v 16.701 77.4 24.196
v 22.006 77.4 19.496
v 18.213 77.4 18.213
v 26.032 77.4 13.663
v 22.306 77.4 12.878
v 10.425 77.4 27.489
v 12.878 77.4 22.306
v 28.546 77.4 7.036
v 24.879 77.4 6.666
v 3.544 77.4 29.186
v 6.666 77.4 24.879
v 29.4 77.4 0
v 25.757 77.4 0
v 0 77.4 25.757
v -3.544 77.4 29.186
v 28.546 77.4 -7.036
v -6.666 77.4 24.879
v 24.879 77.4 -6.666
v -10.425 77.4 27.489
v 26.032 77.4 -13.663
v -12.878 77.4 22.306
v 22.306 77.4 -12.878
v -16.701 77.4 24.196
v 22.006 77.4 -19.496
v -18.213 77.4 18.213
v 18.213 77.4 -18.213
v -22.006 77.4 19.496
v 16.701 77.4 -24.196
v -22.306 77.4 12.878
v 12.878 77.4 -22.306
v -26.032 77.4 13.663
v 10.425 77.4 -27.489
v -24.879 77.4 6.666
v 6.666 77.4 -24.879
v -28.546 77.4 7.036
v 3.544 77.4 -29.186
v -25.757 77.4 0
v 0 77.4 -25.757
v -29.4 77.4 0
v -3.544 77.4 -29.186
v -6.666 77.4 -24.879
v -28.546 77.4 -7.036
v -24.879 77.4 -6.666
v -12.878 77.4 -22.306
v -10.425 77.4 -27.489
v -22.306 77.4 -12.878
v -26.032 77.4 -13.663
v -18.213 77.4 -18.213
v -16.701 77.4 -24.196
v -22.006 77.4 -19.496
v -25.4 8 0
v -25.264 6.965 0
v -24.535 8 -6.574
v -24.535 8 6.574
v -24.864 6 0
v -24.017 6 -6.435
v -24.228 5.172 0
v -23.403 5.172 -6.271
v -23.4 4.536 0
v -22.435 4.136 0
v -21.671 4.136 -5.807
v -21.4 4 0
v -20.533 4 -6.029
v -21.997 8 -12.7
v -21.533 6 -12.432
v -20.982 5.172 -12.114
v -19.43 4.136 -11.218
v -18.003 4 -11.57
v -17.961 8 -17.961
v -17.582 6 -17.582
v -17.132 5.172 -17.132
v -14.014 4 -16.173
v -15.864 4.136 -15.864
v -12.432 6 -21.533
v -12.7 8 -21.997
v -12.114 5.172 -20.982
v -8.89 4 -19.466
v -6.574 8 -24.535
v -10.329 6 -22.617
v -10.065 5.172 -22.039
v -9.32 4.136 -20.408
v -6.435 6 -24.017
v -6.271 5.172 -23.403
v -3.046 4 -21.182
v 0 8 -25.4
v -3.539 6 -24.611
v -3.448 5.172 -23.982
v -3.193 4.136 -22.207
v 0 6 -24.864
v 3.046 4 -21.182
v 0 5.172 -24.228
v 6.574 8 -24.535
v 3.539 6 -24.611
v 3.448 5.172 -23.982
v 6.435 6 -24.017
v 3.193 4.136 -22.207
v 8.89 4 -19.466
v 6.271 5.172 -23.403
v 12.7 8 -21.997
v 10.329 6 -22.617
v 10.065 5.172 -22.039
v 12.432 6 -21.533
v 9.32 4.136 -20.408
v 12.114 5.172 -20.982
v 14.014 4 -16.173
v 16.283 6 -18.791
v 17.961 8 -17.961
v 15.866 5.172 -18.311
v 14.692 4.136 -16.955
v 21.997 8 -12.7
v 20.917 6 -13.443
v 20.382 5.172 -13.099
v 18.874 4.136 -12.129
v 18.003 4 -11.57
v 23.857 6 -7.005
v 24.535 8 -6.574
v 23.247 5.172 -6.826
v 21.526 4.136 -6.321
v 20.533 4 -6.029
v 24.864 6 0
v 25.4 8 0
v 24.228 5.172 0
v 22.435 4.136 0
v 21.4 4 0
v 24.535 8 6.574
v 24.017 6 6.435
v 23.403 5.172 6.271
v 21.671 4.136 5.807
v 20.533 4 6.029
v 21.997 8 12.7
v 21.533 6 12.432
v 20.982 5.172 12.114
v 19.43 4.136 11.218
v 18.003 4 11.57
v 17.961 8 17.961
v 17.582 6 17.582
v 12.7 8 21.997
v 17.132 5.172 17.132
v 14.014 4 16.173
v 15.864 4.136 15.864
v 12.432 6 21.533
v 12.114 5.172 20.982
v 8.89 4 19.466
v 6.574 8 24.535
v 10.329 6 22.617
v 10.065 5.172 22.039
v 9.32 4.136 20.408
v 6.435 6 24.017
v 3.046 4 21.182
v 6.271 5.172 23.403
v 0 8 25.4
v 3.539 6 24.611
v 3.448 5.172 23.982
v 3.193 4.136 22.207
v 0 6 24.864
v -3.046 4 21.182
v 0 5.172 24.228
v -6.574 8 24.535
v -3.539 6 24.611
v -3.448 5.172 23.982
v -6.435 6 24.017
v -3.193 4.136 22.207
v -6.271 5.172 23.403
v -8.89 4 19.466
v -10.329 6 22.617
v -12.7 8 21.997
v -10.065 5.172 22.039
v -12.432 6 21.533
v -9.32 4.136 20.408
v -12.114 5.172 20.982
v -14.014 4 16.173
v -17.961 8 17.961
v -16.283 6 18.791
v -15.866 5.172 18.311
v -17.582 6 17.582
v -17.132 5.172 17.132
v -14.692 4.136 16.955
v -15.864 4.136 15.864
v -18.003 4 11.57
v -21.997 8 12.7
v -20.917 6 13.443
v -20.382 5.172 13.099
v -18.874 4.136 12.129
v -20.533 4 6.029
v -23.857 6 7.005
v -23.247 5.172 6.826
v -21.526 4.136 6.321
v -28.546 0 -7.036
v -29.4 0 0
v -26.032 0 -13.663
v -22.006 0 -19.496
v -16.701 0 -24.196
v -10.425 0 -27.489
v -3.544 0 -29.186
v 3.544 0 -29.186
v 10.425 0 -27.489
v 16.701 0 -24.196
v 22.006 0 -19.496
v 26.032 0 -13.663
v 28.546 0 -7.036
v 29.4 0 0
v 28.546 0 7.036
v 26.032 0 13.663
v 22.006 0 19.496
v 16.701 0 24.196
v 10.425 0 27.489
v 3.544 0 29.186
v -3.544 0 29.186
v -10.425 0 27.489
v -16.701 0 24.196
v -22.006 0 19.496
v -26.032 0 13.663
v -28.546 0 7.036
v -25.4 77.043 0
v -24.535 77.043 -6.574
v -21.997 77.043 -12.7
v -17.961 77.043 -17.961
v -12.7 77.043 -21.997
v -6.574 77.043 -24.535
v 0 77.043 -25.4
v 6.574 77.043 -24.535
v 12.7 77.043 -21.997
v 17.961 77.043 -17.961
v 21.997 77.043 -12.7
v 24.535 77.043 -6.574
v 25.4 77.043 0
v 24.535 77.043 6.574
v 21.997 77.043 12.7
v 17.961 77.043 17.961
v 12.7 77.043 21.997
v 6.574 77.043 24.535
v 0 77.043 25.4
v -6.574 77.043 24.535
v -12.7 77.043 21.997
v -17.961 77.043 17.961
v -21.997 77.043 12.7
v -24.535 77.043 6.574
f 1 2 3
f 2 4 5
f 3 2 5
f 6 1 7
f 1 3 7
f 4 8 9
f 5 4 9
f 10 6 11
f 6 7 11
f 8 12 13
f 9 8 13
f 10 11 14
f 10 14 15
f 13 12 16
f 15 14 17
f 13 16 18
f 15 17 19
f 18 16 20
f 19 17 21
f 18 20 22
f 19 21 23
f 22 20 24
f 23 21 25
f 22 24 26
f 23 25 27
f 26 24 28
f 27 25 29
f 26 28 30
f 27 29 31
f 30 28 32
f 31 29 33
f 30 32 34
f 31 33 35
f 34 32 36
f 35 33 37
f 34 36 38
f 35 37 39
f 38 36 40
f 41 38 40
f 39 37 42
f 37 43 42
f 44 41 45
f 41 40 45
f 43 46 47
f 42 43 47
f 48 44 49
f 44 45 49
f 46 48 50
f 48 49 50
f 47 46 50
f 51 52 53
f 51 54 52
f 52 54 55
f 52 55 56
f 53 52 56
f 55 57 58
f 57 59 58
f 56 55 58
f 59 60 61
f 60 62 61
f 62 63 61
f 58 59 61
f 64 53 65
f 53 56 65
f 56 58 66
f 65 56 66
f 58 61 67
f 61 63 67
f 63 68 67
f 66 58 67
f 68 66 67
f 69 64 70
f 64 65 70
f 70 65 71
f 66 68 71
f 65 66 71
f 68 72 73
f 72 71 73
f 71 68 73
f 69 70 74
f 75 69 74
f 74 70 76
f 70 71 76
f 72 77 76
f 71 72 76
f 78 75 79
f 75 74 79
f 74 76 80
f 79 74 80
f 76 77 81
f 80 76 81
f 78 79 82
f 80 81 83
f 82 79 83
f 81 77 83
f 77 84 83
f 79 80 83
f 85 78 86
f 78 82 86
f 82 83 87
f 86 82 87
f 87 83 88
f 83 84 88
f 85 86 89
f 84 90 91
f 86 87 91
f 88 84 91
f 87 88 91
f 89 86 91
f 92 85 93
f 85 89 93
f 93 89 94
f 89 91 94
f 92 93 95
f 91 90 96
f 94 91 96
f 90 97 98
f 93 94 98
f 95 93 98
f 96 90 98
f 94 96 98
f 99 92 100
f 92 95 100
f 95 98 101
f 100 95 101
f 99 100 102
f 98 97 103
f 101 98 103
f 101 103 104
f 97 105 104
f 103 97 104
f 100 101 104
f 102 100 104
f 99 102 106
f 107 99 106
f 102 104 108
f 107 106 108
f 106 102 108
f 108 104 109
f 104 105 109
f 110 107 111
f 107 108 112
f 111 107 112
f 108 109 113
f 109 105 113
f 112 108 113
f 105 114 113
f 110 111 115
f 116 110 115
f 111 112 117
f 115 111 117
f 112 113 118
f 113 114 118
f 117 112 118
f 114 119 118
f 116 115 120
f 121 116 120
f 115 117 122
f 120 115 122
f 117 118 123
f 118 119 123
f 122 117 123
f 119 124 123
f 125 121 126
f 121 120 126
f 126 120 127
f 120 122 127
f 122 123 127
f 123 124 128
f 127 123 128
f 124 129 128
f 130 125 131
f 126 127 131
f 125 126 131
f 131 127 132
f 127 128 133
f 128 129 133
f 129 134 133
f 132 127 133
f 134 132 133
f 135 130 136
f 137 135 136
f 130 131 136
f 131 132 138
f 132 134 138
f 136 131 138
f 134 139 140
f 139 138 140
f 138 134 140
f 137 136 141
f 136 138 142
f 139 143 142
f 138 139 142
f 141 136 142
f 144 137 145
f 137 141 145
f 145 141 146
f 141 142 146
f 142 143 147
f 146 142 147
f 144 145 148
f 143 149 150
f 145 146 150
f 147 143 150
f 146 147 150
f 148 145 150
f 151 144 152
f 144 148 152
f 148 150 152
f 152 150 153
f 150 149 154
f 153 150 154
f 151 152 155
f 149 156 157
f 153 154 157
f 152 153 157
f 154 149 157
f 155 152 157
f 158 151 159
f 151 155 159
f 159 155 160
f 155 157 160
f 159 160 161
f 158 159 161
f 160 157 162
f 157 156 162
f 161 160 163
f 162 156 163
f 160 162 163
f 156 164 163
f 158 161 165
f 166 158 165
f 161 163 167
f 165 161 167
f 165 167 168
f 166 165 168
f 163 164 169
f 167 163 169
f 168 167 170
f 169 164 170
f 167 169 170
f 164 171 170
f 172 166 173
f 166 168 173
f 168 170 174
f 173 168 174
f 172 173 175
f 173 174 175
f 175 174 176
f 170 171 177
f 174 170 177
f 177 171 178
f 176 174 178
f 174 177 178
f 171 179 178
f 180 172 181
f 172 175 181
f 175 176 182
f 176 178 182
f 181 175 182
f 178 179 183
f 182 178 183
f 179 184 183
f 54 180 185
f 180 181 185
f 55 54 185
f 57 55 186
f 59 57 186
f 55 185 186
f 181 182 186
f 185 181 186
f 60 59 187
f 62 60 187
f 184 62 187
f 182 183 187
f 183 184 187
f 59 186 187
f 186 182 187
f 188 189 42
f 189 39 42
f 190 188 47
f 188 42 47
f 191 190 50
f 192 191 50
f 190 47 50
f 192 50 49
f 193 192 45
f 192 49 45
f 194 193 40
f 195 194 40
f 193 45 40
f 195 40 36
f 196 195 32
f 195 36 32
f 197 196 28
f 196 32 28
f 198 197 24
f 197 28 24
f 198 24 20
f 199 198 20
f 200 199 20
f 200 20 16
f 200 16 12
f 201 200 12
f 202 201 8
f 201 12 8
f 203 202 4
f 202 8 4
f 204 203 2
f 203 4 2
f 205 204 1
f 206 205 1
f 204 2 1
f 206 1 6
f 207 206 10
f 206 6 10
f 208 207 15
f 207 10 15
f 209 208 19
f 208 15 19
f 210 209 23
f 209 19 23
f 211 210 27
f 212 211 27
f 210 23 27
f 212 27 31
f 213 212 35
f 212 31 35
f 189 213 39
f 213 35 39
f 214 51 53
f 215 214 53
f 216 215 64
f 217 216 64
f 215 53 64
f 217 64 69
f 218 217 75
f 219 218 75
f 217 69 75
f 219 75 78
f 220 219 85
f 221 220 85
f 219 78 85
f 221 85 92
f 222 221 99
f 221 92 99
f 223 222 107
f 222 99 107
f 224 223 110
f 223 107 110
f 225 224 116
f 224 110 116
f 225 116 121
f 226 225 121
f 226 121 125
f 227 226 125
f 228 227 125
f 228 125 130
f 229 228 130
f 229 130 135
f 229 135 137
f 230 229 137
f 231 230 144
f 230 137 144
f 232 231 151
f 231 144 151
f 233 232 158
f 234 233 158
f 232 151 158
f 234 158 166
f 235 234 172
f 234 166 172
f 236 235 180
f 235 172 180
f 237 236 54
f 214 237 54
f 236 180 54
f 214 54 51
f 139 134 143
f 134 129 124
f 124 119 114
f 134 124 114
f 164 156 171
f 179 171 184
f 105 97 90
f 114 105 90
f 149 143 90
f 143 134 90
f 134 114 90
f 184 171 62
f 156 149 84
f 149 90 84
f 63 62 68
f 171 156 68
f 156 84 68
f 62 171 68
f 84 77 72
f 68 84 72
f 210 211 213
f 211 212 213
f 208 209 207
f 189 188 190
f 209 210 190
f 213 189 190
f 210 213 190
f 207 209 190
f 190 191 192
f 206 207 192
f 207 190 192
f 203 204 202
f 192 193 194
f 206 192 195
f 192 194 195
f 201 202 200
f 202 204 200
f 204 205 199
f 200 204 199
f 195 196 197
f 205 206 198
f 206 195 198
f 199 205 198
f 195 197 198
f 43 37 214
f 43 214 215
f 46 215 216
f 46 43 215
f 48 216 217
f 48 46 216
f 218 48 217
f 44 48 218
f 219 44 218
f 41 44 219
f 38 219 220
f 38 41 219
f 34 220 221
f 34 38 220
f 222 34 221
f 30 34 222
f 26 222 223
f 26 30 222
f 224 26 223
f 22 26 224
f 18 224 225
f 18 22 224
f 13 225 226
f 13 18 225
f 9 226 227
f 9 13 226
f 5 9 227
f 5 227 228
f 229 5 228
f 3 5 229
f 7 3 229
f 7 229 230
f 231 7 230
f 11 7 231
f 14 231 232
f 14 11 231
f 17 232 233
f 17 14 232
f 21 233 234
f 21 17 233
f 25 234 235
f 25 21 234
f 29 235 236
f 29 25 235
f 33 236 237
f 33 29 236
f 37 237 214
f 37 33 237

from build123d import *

# Parameters (mm, degrees)
FILLET3_R     = 4
CHAMFER1_SIZE = 0.3569


with BuildPart() as part:
    # Main Revolve Sketch → Cylinder Main Revolve (revolve)
    with BuildSketch(Plane.XY, mode=Mode.PRIVATE) as cylinder_main_revolve_sk:
        Polygon((0, 0), (29.4, 0), (29.4, 77.4), (25.4, 77.4), (25.4, 4), (0, 4), align=None)
    revolve(cylinder_main_revolve_sk.sketch.rotate(Axis((0, 4, 0), (0, -1, 0)), 180), axis=Axis((0, 4, 0), (0, -1, 0)))

    # Fillet3
    fillet3_edges = [part.edges().sort_by_distance(p)[0] for p in [
        (25.4, 4, 0),
    ]]
    fillet(fillet3_edges, radius=FILLET3_R)

    # Chamfer1
    chamfer1_edges = [part.edges().sort_by_distance(p)[0] for p in [
        (25.4, 77.4, 0),
    ]]
    chamfer(chamfer1_edges, length=CHAMFER1_SIZE)


solid = part.part
